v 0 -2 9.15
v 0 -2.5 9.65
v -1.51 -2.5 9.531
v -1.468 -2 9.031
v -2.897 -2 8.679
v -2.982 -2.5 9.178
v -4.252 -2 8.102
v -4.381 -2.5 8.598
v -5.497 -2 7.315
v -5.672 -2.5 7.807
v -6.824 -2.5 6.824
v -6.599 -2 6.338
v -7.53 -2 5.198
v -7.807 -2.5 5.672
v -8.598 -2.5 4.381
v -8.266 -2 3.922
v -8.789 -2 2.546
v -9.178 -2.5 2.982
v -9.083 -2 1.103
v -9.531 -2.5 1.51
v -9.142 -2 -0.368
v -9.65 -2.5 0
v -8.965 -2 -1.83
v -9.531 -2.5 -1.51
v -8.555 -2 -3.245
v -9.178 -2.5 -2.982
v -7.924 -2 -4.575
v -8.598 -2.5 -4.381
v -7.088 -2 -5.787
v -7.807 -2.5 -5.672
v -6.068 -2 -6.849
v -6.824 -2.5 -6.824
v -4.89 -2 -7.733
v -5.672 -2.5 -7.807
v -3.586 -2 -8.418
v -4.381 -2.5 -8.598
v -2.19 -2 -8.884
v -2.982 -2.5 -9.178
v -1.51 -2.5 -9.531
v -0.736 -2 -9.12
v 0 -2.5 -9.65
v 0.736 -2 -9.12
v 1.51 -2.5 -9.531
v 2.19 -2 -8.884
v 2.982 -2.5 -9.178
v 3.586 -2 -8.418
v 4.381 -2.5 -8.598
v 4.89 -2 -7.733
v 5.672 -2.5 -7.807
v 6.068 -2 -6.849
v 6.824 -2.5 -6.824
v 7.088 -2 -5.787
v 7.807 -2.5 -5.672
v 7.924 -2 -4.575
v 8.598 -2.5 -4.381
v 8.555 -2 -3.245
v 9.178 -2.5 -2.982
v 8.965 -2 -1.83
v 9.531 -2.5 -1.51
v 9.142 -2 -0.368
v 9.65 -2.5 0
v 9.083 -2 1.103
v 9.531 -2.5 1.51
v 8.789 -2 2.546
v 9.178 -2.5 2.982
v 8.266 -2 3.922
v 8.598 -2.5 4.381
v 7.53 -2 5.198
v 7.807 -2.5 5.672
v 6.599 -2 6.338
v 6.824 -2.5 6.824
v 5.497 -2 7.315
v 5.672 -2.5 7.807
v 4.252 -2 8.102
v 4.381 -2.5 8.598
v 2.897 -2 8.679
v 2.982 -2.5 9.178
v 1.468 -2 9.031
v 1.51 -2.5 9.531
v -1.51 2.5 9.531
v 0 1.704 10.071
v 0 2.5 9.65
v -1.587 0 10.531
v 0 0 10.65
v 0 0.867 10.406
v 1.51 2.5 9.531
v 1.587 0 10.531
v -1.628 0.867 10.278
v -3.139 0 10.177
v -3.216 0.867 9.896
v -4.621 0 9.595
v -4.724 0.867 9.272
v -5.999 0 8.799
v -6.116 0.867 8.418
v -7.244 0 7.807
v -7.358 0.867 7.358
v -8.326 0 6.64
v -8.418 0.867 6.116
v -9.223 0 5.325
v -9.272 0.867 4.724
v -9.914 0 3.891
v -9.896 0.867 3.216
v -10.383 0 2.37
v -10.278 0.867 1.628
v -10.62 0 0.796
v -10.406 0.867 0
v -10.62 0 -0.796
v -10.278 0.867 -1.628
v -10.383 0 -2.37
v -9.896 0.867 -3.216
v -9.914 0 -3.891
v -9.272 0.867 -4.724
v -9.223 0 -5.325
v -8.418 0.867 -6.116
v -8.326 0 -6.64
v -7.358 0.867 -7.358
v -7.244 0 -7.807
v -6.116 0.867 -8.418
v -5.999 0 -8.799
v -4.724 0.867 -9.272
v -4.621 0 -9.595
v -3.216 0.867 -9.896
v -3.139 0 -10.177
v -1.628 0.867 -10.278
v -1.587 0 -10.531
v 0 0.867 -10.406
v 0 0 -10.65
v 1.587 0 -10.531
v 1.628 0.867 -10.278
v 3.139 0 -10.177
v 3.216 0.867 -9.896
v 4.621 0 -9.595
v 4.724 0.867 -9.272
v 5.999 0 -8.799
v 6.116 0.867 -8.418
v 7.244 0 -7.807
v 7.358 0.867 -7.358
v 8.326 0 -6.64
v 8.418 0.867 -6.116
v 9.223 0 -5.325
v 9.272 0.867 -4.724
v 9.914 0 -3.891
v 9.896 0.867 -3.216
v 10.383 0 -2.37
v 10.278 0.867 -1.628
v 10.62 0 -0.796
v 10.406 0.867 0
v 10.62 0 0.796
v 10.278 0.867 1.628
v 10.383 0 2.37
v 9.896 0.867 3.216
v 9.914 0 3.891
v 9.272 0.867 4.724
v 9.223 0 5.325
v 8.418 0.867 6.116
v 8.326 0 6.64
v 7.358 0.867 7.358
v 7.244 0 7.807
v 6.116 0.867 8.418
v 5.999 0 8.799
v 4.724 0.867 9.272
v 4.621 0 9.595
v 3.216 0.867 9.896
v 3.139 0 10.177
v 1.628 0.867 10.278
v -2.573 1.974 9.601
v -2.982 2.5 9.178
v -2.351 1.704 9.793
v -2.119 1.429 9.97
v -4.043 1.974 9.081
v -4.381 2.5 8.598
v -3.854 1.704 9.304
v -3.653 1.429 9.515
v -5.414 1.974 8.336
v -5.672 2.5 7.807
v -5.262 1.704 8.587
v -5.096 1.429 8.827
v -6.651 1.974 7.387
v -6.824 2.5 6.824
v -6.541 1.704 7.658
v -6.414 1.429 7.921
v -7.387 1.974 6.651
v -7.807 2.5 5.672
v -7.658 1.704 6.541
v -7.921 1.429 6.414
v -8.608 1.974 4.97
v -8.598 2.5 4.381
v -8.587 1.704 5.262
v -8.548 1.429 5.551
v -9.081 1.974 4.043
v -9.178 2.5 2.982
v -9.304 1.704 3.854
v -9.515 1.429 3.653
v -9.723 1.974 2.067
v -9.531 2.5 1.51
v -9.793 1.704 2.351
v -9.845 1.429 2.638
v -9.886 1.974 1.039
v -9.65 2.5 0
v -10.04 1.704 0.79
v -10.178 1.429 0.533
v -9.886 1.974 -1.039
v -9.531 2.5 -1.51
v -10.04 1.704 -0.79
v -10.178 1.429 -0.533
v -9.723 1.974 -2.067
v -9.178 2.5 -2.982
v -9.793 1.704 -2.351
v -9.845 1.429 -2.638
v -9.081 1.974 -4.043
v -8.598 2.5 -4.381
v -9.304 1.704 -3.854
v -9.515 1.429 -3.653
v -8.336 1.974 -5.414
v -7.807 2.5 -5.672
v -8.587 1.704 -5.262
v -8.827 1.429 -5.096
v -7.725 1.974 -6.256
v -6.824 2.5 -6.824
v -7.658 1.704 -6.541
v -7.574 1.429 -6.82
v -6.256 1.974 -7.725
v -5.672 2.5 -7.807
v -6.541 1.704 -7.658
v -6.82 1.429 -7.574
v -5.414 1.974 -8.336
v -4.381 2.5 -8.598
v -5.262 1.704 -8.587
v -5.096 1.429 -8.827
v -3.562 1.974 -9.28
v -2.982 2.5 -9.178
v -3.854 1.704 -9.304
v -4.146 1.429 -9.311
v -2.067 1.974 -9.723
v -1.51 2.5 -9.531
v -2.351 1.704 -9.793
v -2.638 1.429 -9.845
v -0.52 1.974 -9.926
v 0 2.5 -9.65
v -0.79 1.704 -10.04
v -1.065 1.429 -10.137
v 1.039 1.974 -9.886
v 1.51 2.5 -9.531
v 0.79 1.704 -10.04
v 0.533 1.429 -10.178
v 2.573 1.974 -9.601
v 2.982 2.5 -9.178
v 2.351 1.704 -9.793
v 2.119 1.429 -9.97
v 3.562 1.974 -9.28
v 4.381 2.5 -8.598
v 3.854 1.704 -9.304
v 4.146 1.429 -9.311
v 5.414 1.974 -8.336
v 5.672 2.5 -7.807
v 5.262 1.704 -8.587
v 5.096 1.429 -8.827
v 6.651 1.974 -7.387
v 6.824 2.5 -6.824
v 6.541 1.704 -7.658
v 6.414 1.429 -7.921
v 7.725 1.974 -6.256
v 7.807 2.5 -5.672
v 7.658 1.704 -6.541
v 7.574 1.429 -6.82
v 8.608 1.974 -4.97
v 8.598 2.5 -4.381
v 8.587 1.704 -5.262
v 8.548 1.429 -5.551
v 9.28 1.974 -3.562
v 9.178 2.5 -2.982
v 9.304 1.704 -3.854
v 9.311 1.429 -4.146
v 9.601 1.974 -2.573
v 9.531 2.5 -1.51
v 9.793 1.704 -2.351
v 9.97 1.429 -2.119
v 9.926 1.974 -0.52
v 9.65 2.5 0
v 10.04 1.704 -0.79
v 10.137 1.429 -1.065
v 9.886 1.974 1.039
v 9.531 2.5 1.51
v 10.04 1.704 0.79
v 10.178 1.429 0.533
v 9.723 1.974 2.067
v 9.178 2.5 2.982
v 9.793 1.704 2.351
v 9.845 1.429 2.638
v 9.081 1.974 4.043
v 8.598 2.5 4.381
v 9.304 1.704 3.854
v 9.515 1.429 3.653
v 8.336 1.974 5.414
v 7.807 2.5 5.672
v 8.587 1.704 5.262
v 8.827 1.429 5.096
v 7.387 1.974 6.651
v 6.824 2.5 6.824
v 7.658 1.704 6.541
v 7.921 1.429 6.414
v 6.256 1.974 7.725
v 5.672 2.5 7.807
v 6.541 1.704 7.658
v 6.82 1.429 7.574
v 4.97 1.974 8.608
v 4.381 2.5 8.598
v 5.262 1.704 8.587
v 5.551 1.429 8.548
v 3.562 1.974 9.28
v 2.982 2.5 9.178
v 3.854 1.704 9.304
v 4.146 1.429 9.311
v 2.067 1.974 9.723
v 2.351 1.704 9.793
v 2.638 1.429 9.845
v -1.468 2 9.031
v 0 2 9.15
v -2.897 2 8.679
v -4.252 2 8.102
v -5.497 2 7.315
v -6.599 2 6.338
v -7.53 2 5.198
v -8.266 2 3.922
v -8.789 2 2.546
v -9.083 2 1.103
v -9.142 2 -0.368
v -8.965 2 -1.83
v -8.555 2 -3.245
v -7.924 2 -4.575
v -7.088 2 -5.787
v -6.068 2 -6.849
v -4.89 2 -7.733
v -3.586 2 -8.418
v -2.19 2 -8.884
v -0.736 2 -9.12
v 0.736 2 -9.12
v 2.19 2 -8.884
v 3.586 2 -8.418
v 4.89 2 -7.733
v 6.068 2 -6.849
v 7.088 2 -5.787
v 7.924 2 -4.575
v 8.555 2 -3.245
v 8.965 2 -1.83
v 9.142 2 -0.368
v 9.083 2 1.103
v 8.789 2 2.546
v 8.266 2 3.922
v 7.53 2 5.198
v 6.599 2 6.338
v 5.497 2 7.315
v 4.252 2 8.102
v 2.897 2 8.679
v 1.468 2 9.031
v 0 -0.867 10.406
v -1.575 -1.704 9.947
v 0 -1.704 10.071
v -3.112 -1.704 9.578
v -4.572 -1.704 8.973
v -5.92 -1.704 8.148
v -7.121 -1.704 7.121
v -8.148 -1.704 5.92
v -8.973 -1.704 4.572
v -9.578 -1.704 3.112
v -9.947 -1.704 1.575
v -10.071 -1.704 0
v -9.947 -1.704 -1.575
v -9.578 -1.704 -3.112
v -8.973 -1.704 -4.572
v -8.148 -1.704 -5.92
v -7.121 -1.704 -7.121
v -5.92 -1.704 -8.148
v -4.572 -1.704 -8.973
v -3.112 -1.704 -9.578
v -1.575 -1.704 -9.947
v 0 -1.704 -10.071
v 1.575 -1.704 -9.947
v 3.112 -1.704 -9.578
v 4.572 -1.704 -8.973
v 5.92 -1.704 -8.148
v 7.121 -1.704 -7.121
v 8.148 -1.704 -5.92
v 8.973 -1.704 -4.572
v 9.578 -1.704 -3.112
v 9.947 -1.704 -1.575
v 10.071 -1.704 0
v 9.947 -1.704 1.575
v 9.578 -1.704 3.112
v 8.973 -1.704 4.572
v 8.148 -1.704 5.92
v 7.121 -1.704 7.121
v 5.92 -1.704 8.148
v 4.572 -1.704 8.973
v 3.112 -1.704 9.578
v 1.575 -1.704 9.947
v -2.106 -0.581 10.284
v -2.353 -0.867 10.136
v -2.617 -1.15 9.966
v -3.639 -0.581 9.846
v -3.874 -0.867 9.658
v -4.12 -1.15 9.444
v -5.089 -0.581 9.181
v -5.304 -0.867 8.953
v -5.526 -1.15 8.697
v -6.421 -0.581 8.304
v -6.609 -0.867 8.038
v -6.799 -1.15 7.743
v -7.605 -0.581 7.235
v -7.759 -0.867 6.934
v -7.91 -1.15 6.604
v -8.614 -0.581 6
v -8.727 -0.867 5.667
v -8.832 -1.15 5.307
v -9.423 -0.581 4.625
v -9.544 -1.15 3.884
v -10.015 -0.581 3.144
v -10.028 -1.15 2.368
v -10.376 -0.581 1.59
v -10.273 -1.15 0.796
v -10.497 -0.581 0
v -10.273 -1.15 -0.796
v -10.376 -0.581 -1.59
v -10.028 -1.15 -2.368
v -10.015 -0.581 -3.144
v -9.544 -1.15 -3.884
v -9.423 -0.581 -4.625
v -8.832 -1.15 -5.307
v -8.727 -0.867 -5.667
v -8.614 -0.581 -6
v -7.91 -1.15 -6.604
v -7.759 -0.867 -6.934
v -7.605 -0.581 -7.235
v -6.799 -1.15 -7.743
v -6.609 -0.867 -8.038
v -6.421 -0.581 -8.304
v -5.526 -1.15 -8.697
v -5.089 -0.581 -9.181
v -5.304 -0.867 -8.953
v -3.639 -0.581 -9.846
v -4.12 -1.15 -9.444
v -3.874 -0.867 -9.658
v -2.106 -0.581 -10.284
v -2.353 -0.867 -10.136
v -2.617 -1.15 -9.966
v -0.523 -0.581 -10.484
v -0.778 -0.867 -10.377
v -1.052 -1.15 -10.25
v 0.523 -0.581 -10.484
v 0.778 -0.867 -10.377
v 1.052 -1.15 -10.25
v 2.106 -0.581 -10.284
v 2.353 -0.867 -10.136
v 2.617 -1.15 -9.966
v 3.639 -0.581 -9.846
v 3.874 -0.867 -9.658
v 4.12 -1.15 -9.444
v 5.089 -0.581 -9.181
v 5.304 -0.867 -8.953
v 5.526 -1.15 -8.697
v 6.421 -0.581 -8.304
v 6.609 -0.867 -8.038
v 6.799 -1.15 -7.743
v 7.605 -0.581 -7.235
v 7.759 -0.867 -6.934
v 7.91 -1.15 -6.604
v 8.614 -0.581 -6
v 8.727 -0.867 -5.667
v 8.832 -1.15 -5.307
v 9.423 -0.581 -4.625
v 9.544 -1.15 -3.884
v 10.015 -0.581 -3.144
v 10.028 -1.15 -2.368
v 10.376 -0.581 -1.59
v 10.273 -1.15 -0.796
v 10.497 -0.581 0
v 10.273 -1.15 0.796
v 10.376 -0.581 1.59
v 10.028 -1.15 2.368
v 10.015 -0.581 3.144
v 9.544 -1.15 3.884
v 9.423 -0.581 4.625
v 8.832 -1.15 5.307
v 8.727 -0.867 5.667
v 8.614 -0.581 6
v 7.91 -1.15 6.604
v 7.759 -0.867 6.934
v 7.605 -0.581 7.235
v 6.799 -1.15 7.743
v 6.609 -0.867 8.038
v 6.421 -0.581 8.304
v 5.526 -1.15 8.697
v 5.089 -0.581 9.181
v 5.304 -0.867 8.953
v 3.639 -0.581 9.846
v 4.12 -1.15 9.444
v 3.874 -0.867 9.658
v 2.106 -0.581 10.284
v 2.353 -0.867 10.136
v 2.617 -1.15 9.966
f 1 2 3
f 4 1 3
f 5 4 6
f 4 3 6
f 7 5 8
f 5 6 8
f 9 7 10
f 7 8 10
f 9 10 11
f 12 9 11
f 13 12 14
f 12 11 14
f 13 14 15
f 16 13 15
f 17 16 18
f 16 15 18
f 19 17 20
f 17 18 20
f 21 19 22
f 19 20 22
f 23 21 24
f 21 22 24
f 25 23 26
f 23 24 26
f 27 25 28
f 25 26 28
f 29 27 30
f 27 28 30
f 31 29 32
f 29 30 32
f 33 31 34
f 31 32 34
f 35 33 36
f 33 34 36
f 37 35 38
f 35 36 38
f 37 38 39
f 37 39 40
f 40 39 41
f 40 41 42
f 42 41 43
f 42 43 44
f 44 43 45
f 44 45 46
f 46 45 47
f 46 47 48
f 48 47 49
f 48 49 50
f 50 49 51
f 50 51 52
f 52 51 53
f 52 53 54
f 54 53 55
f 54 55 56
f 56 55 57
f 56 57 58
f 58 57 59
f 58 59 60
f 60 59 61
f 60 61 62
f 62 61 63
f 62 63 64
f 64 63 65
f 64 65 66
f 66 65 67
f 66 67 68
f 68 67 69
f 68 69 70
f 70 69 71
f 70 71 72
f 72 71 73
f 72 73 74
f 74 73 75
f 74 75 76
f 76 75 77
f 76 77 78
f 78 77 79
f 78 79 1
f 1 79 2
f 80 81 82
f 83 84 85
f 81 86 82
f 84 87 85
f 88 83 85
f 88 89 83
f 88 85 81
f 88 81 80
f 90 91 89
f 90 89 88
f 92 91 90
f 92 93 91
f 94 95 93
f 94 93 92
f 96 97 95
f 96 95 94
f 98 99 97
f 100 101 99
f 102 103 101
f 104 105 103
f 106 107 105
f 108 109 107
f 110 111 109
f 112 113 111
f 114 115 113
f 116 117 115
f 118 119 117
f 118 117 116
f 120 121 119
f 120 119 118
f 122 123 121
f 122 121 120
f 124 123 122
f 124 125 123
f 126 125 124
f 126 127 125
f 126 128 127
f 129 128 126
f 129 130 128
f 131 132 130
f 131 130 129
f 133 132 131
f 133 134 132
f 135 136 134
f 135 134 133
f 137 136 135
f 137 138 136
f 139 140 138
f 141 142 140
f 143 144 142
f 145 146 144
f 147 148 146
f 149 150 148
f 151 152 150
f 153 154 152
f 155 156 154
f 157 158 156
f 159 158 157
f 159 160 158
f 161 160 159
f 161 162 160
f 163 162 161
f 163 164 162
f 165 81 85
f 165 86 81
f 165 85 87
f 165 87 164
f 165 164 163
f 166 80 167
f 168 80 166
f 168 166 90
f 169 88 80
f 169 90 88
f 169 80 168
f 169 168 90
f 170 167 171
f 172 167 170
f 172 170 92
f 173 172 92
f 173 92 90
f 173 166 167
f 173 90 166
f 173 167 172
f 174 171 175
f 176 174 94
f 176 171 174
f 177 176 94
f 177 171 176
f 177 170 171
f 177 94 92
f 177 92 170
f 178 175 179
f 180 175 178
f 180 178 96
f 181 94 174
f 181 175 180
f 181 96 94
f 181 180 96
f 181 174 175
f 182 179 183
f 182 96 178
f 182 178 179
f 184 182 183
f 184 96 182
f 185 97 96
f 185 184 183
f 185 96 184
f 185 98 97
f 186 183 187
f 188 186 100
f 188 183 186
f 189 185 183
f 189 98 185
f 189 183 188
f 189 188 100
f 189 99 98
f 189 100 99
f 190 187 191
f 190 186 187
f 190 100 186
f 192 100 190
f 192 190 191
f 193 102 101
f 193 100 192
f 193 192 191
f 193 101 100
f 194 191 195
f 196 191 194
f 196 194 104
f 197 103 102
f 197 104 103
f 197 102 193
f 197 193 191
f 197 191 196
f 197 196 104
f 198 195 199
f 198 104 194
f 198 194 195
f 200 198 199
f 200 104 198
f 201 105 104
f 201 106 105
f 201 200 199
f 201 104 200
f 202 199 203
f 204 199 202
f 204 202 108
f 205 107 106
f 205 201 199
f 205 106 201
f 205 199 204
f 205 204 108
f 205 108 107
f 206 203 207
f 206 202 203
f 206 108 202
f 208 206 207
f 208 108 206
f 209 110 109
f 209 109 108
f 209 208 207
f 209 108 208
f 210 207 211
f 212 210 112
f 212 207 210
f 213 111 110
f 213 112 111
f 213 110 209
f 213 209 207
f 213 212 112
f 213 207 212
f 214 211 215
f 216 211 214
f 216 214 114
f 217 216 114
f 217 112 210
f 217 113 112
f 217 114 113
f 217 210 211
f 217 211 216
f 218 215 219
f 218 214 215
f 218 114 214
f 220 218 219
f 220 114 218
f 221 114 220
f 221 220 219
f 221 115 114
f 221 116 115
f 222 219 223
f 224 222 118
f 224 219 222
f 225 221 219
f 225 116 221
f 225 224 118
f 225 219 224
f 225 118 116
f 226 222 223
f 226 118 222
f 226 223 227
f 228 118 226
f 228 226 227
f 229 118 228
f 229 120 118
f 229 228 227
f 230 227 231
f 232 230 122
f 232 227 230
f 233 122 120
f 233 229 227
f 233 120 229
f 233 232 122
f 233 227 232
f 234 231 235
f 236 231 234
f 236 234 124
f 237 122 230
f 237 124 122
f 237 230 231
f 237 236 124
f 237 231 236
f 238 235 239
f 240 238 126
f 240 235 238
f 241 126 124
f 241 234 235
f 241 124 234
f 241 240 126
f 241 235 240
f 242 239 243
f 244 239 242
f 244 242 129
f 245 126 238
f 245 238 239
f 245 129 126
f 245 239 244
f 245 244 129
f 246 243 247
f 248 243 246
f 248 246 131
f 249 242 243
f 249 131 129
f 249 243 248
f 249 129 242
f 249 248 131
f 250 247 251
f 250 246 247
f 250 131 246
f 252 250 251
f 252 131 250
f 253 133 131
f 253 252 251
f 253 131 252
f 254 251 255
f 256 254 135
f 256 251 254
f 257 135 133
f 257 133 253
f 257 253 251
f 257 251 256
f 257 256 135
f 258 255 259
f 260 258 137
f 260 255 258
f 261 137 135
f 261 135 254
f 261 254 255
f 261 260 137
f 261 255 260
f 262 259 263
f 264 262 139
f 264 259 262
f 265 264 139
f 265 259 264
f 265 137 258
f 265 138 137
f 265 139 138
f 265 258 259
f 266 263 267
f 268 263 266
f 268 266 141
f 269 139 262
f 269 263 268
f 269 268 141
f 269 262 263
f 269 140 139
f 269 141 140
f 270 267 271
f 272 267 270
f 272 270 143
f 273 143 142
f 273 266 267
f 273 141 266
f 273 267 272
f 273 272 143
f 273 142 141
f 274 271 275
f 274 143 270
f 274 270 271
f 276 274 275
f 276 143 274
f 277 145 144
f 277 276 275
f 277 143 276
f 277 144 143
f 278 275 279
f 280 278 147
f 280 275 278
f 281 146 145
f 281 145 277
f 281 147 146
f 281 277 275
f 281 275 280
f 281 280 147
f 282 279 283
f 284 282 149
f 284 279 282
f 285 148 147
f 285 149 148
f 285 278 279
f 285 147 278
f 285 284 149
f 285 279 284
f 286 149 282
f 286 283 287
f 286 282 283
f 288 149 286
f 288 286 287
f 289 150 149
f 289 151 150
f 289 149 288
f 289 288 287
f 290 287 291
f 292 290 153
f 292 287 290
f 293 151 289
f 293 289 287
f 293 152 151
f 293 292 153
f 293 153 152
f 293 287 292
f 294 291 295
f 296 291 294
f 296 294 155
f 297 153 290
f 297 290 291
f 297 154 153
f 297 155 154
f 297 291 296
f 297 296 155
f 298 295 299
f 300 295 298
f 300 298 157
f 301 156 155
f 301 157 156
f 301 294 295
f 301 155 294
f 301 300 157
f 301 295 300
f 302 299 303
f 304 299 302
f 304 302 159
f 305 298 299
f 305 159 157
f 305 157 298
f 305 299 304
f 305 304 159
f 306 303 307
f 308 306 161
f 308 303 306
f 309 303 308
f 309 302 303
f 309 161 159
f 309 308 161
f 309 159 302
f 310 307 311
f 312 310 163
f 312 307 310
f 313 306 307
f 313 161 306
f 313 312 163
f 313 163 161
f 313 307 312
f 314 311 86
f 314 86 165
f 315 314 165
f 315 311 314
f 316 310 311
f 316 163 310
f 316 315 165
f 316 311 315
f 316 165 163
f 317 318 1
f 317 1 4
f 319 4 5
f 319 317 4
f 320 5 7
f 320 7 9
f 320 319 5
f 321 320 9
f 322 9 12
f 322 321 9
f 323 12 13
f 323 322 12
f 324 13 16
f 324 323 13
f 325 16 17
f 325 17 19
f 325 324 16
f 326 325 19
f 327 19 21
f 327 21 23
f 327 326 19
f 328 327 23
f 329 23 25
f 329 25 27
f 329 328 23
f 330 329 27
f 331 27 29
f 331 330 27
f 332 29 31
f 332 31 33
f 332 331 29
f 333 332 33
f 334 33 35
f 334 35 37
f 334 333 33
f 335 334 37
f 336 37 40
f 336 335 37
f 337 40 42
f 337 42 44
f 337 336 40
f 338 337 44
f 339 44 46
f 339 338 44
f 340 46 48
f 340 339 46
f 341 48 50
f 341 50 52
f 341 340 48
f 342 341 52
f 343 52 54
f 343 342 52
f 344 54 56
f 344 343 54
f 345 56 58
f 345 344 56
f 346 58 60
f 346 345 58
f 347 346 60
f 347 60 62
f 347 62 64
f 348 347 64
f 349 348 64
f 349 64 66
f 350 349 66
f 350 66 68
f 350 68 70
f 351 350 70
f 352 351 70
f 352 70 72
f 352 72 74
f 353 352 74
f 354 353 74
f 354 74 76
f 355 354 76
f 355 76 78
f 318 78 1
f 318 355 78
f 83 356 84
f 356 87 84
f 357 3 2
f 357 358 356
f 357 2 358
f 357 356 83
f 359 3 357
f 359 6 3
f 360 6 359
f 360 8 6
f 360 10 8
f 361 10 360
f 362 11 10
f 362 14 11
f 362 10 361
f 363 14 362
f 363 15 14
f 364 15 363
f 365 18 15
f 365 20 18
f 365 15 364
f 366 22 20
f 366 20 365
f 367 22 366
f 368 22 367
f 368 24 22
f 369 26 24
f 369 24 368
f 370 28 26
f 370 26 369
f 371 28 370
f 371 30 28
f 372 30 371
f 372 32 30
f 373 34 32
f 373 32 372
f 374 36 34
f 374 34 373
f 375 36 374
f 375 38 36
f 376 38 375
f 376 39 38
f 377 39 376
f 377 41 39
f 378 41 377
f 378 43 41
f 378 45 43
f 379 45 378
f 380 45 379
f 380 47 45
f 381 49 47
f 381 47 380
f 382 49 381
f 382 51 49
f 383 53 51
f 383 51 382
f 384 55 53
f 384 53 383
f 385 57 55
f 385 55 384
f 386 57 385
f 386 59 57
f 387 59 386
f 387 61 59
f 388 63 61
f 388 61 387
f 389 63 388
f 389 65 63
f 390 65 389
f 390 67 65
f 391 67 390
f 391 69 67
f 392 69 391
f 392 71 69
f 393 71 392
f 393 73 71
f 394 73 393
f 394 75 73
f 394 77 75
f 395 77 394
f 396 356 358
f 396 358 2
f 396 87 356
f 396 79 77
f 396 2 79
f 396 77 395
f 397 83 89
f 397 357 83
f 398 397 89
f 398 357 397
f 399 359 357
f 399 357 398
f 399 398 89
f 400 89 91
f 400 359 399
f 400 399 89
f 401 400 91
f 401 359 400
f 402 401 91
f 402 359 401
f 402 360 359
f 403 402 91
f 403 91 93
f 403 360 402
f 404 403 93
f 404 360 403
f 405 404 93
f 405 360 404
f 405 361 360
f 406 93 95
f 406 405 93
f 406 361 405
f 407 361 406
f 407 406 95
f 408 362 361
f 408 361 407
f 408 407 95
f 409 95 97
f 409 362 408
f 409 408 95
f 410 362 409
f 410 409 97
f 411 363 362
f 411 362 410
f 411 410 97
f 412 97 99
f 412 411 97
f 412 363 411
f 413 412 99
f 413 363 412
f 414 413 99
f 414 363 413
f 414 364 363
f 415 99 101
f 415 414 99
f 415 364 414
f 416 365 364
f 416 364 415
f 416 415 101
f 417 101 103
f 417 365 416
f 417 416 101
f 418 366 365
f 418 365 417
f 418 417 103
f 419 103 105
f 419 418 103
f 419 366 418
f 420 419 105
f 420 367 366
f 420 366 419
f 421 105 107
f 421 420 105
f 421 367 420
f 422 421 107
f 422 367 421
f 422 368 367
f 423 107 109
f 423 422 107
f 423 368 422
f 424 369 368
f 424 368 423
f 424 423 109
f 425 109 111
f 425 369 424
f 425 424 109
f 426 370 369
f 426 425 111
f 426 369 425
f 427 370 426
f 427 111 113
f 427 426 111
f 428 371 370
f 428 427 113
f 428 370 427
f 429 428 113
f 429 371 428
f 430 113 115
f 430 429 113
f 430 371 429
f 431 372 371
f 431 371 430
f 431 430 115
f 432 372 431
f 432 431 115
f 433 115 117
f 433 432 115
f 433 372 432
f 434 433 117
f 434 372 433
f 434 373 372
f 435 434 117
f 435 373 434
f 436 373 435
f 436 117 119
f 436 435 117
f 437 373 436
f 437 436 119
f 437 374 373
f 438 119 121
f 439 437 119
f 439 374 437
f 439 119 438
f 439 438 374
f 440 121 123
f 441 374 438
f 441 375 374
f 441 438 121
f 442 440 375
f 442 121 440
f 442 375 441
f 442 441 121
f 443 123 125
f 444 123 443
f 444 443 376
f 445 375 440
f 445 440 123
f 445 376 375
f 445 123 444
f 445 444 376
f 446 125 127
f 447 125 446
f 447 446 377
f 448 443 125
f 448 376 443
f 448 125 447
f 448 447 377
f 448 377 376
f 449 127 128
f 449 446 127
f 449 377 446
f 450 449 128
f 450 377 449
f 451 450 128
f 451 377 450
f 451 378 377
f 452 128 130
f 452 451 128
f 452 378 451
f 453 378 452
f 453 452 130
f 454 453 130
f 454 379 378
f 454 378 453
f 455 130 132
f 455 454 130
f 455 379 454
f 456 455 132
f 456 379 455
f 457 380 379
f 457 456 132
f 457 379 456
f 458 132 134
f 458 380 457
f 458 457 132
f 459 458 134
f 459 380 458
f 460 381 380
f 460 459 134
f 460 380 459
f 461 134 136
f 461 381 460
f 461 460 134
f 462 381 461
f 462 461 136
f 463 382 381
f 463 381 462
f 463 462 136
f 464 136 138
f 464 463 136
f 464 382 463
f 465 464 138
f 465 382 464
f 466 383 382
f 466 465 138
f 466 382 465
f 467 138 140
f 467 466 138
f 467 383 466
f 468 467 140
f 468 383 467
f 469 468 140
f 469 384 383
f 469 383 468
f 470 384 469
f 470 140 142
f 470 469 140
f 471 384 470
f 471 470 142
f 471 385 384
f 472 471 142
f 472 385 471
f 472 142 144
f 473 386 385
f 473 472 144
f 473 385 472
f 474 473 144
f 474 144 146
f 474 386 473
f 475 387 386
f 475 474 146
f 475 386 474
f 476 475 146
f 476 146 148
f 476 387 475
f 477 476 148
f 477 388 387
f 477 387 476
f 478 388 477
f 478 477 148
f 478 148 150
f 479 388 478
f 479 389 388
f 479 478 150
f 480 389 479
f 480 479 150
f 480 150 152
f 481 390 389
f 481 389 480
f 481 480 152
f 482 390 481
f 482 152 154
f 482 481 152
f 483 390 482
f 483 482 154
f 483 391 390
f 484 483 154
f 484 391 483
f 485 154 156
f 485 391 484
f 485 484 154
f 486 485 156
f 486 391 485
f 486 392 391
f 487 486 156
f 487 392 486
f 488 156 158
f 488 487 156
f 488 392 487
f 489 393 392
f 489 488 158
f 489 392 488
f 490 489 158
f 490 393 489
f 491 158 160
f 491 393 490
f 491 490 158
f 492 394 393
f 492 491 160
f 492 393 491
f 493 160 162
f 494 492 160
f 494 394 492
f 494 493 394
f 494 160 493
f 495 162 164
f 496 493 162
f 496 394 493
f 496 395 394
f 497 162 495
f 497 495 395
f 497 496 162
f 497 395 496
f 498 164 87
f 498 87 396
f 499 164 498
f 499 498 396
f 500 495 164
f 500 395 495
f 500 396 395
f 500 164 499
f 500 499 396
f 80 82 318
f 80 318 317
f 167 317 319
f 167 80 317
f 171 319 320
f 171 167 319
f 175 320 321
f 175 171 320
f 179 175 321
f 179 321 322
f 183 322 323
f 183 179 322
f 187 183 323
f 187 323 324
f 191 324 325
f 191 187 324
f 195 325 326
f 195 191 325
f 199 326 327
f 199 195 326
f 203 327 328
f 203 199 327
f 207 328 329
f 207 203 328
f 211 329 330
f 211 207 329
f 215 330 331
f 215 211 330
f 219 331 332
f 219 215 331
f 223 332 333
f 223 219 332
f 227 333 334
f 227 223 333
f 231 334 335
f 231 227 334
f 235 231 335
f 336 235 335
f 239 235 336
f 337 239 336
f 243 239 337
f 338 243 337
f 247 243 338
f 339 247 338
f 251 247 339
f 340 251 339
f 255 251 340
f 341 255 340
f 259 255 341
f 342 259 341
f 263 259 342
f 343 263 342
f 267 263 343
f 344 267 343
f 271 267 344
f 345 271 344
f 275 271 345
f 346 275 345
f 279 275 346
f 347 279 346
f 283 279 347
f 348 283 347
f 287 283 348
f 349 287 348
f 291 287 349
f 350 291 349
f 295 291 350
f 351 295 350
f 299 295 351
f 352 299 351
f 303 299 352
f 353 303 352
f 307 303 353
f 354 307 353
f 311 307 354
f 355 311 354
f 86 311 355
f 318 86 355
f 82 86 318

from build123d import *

# Parameters (mm, degrees)
F3_SIZE = 0.49999


# Not quite as in the source:
# - a fillet or chamfer is up to 0.001 mm smaller than in the source, because OpenCascade refuses the exact size


with BuildPart() as f2:
    # F1 (on Right) → F2 (revolve)
    with BuildSketch(Plane.YZ):
        with BuildLine():
            Line((-2.5, 9.1499136761), (0, 9.1499136761))
            Line((0, 9.1499136761), (2.5, 9.1499136761))
            Line((2.5, 9.1499136761), (2.5, 9.6499136761))
            ThreePointArc((2.5, 9.6499136761), (1.2898169642, 10.2494560866), (0, 10.6499136761))
            ThreePointArc((0, 10.6499136761), (-1.2898169642, 10.2494560866), (-2.5, 9.6499136761))
            Line((-2.5, 9.6499136761), (-2.5, 9.1499136761))
        make_face()
    revolve(axis=Axis((0, 0, 0), (0, -1, 0)))

    # F3 (size 0.5 in the source; OpenCascade refuses exactly that, so slightly less here)
    f3_edges = [f2.edges().sort_by_distance(p)[0] for p in [
        (0, -2.5, -9.149914),
        (0, 2.5, -9.149914),
    ]]
    chamfer(f3_edges, length=F3_SIZE)


solid = f2.part
